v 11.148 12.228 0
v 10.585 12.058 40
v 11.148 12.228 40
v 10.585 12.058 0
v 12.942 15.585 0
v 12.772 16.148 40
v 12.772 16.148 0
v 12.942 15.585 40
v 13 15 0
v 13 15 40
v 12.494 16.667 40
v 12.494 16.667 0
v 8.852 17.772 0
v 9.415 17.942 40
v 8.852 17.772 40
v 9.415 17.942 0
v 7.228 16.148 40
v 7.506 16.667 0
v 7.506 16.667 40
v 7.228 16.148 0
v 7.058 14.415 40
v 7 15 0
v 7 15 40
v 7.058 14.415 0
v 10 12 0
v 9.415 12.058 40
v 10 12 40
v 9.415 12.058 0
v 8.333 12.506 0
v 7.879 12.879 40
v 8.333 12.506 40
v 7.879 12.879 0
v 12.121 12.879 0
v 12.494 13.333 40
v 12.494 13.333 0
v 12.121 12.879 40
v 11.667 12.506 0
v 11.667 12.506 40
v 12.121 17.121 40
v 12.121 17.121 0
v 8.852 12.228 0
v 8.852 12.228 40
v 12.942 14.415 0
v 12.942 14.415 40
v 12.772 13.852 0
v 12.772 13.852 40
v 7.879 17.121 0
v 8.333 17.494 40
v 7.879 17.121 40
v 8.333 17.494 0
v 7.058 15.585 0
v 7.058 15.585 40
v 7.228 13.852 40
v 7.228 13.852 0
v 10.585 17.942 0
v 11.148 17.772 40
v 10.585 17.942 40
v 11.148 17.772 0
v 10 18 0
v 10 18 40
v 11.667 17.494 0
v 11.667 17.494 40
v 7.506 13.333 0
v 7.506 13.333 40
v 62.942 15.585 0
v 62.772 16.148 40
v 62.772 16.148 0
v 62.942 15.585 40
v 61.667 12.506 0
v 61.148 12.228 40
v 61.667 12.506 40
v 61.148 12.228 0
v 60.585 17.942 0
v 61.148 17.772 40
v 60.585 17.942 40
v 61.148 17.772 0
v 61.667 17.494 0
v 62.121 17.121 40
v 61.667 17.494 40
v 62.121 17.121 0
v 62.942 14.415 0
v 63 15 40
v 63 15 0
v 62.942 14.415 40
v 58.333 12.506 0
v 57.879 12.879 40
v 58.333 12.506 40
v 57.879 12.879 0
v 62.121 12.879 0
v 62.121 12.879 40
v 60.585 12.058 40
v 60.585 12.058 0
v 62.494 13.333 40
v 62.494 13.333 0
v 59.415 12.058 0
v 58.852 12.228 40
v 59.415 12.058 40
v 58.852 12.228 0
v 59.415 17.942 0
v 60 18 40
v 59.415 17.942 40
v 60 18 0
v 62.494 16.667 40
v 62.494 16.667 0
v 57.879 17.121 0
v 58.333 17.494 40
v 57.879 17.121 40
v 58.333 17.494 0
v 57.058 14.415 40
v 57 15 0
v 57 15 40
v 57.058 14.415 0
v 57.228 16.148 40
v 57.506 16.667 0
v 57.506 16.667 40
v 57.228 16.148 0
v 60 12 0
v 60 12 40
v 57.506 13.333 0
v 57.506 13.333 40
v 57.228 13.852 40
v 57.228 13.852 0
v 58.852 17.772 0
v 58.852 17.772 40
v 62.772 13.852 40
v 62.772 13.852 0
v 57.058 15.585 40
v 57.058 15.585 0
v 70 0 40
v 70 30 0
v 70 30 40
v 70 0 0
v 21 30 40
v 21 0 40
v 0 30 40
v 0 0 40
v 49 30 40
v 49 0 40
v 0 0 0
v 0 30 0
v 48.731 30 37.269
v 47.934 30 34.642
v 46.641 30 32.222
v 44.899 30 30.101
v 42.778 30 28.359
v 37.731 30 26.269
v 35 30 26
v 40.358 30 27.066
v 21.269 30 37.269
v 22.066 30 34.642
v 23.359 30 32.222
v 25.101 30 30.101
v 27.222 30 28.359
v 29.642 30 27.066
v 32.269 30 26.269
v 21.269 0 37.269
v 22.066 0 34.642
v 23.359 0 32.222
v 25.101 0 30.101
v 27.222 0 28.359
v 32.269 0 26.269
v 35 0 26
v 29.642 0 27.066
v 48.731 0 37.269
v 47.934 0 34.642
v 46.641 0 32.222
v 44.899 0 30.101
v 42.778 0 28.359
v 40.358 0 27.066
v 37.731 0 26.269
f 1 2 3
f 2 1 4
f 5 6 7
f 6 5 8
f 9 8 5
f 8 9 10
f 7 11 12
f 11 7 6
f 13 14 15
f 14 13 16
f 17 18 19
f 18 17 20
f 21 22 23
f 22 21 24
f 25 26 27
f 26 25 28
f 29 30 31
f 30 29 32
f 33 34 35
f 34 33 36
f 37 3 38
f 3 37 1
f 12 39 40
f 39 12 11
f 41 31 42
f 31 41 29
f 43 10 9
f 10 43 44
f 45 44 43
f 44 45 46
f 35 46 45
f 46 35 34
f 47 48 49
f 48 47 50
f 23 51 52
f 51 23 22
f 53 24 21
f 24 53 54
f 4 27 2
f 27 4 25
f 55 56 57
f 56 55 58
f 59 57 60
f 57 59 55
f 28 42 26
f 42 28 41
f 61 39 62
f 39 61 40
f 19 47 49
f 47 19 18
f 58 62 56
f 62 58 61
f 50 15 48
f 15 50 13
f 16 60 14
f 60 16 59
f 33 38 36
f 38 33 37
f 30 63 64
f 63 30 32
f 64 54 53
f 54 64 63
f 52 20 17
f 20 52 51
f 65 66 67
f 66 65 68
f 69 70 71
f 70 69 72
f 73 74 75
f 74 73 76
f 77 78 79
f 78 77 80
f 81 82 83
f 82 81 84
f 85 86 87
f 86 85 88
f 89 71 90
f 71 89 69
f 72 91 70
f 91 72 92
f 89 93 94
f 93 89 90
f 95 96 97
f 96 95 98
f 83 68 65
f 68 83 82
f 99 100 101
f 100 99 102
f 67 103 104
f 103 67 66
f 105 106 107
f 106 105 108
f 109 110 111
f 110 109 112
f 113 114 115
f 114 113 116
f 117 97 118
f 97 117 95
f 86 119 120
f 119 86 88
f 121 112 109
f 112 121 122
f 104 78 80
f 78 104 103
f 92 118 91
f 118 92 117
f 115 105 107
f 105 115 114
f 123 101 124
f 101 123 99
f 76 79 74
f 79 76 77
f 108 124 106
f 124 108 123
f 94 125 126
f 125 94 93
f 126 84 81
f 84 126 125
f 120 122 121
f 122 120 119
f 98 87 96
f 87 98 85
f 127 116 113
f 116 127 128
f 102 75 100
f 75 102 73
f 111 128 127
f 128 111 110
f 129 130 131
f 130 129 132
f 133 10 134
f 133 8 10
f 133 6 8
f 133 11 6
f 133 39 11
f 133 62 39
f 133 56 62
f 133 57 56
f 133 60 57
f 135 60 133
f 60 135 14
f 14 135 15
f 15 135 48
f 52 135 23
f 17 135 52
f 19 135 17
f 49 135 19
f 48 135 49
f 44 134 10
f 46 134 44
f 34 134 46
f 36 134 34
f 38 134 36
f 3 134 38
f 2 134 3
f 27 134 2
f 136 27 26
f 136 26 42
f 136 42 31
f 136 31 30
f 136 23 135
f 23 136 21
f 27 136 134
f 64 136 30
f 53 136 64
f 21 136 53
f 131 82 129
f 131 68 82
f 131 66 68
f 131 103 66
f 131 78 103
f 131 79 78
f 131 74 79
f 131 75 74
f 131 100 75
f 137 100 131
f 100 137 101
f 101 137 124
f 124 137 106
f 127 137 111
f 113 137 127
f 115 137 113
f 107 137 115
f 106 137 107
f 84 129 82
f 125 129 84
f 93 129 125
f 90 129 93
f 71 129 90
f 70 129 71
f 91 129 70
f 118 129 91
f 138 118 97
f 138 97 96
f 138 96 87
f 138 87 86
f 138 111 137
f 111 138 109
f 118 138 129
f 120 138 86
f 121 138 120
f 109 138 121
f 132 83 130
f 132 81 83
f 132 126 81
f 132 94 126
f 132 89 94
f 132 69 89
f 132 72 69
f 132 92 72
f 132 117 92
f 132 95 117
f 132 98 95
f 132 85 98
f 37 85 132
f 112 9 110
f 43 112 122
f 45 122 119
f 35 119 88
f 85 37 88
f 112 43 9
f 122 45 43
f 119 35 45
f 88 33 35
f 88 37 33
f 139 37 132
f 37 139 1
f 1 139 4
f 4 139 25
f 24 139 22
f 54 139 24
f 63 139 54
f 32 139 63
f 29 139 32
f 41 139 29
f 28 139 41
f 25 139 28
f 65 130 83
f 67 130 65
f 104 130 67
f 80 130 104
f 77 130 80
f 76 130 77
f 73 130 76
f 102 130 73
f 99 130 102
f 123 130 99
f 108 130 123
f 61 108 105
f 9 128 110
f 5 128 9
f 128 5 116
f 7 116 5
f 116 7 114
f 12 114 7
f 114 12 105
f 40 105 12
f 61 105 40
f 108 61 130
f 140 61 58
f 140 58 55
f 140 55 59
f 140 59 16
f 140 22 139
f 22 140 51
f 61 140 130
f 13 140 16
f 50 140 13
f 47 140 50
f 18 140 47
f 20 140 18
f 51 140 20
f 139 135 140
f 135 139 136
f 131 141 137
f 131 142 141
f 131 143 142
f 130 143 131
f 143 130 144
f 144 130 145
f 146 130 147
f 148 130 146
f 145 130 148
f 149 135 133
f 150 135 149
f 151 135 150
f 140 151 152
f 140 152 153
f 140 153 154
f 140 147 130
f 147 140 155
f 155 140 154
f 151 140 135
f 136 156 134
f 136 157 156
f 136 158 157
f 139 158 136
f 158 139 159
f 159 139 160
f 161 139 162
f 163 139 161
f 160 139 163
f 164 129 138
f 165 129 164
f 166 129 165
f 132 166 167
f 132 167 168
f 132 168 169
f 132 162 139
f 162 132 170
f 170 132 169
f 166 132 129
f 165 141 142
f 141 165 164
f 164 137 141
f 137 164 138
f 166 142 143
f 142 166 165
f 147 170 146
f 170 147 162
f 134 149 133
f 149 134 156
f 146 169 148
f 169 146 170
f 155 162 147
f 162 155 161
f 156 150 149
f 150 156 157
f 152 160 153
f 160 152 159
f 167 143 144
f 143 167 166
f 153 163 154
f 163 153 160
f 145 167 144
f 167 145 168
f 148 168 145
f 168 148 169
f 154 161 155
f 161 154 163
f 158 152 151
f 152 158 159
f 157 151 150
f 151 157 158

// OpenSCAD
$fn = 32;

// ----------------------------------------------------------------------
// Saddle clamp: plain shaft clamp
// ----------------------------------------------------------------------

// --- parameters (mm) ---
blk_l = 70;               // block length, X
blk_w = 30;               // block width, Y
blk_h = 40;               // block height
clamp_r = 14;             // shaft groove radius
hole_r = 3;               // bolt hole radius
hole_m = 10;              // bolt hole margin from the ends

saw_depth = clamp_r + 3;  // saw kerf depth

difference() {
  cube([blk_l, blk_w, blk_h]);
  translate([blk_l / 2, -1, blk_h])
    rotate([-90, 0, 0])
      cylinder(h = blk_w + 2, r = clamp_r);
  for (sx = [0, 1])
    translate([sx ? blk_l - hole_m : hole_m, blk_w / 2, -1])
      cylinder(r = hole_r, h = blk_h + 2);
}
